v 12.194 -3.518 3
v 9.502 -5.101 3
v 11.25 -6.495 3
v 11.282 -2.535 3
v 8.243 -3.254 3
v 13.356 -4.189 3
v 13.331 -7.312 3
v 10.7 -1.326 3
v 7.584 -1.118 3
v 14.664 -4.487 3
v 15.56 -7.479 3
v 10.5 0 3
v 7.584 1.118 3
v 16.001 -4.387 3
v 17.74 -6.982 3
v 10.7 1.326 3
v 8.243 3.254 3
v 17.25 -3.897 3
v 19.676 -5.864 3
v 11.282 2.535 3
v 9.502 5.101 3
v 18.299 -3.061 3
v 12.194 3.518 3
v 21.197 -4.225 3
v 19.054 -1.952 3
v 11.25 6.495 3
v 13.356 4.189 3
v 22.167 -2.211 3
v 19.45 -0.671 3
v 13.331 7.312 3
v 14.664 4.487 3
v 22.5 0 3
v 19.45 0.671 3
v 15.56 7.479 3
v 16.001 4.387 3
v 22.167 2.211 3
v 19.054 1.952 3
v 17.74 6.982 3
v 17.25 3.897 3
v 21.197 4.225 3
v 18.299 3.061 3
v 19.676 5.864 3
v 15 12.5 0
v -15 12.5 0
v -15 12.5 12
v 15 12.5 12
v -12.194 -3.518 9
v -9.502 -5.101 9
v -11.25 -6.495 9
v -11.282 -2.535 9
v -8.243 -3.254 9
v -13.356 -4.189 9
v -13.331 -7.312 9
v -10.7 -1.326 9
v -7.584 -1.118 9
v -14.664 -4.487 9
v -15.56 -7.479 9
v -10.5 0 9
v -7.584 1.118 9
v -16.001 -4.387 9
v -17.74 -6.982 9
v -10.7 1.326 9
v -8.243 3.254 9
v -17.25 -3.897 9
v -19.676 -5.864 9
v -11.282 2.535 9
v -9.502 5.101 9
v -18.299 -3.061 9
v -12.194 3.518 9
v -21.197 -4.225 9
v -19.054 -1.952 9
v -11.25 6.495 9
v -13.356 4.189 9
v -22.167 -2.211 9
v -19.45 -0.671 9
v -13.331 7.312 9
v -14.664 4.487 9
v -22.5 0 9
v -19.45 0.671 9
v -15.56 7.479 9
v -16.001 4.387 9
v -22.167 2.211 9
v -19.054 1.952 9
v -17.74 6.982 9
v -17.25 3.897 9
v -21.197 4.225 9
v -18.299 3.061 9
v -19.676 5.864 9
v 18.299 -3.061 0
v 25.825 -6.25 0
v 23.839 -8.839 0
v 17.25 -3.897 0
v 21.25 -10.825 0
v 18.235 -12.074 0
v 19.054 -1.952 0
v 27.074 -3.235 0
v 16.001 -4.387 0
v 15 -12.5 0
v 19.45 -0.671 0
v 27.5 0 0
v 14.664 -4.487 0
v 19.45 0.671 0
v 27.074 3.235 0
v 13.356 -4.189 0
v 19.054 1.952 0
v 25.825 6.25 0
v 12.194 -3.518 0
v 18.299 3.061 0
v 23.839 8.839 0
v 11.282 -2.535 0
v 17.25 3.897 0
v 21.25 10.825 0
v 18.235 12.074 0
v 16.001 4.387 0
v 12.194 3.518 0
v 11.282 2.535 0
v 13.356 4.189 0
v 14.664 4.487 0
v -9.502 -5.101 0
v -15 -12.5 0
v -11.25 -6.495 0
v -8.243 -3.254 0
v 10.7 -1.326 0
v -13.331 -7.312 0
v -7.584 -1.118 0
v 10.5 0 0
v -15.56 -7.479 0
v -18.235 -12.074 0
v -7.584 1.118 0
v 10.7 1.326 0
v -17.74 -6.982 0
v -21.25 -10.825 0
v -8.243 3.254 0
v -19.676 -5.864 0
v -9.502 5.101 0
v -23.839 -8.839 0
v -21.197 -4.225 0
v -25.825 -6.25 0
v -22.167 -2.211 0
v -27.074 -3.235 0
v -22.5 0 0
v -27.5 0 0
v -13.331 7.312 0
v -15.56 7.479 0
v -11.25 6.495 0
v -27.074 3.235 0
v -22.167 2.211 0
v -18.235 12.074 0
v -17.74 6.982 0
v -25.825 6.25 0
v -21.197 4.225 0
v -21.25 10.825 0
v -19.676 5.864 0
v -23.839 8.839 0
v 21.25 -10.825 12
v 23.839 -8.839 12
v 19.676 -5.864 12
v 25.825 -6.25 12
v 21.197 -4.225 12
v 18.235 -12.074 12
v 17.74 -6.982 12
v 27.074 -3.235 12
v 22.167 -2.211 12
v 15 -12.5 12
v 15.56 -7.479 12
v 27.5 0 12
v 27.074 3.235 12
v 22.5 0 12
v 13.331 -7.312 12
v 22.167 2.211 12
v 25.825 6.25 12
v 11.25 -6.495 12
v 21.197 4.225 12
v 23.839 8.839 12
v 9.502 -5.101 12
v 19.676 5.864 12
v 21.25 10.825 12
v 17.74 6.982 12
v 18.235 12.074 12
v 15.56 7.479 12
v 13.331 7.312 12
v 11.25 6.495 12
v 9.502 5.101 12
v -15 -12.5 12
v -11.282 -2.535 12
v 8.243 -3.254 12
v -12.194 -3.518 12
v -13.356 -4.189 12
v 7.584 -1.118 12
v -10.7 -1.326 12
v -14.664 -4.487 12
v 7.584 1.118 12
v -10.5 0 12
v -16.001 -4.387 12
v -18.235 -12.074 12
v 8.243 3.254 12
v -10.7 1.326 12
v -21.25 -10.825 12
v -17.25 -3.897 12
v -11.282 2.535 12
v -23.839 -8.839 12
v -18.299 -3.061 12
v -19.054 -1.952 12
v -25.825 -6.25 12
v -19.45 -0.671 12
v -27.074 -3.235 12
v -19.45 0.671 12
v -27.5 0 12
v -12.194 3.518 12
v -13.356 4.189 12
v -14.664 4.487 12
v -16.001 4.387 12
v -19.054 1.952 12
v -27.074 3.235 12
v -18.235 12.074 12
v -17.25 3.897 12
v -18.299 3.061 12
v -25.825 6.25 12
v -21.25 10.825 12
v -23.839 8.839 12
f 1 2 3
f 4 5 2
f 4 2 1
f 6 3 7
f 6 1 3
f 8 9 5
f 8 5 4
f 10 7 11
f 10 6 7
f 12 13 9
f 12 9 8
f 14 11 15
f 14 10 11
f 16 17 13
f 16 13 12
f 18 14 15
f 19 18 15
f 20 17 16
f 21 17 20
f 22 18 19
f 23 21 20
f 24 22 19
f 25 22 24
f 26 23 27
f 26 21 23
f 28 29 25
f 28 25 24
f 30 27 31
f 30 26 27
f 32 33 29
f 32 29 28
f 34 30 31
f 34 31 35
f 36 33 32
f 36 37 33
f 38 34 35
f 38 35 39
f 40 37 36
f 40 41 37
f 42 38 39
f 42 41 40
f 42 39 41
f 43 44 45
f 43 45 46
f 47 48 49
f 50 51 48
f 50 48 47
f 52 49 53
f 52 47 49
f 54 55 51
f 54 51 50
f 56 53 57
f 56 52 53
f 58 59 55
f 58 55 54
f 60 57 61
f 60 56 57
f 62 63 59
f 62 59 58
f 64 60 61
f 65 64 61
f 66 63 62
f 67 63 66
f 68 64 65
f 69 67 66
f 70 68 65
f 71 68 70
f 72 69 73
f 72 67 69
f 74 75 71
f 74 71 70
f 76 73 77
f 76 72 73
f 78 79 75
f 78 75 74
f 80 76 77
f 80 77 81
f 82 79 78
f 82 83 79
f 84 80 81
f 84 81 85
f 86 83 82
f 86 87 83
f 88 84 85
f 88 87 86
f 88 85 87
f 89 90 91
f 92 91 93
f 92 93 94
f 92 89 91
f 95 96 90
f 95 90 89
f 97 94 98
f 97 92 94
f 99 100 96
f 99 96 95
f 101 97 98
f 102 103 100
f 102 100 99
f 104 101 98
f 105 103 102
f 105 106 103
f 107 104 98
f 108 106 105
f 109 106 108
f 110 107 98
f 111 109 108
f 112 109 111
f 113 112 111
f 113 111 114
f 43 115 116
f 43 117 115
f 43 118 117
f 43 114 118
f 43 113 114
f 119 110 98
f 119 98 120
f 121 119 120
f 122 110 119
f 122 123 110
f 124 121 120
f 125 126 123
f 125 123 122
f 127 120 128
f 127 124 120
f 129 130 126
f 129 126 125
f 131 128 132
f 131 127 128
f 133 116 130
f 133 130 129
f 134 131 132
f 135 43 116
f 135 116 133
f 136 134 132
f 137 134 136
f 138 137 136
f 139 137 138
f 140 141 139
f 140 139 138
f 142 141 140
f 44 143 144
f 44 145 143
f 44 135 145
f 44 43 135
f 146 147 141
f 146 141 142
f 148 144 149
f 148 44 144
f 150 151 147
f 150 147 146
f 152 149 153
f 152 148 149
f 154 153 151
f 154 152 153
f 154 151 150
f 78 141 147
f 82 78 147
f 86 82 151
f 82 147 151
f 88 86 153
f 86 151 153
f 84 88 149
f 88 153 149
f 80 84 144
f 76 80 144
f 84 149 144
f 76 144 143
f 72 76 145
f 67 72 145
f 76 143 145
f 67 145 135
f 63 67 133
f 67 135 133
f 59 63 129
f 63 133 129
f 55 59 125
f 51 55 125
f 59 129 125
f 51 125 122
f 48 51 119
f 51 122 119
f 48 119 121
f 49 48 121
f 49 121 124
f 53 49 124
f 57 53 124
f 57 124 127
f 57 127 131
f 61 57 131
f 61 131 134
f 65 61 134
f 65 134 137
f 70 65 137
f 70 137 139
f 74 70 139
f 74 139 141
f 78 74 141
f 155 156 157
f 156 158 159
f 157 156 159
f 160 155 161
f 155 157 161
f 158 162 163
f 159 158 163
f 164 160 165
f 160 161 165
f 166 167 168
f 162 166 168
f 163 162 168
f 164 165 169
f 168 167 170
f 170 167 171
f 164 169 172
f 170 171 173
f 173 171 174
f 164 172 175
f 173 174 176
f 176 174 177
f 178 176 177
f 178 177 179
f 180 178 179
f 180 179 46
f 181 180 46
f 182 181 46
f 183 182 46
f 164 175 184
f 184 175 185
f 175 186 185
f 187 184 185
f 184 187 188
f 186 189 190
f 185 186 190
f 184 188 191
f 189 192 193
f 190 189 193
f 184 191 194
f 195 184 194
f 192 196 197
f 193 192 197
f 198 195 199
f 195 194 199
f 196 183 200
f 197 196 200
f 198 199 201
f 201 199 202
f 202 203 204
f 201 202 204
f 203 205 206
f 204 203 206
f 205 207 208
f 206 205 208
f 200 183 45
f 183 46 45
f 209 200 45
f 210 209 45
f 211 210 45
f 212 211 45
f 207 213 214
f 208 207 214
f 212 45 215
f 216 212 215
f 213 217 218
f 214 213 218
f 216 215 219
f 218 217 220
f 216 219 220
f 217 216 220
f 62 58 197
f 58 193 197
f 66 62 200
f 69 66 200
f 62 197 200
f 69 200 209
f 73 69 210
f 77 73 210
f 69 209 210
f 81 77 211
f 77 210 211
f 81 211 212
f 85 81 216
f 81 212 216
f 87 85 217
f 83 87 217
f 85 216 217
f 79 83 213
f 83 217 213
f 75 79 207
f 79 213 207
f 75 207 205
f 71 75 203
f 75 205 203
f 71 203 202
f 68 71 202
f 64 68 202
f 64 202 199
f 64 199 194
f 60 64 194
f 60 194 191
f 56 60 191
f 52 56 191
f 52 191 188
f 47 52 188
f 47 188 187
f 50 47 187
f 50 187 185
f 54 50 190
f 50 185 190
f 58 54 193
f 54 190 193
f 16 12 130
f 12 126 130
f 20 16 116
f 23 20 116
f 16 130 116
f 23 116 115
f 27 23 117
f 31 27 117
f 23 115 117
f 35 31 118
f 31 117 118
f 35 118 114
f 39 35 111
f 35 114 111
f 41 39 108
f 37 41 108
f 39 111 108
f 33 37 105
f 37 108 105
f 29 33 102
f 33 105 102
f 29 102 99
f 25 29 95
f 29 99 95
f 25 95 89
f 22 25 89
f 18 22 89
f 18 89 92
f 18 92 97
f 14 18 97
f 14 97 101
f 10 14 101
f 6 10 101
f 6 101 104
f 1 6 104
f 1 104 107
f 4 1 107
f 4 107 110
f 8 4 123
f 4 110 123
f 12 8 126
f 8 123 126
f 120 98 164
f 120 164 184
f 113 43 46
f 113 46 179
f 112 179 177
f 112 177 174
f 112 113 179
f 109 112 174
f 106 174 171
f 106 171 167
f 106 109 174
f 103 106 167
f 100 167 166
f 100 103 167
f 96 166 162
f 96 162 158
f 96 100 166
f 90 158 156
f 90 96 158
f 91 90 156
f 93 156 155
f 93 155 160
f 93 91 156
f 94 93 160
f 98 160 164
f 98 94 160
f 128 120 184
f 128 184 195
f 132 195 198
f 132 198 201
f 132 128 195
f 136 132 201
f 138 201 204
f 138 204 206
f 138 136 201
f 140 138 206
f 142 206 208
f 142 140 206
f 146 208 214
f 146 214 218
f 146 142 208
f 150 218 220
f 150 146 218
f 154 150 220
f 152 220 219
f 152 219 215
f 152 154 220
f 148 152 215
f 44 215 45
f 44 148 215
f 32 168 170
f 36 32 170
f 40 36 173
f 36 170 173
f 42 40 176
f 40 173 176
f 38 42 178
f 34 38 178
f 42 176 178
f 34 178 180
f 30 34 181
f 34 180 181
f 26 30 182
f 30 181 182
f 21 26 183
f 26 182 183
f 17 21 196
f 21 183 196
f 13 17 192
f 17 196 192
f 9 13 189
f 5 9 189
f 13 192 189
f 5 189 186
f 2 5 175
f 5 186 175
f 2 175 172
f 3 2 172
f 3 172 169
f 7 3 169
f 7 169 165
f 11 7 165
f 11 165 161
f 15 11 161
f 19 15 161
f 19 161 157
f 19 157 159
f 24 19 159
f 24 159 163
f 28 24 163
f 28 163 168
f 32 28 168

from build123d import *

# Parameters (mm, degrees)
EXTRUDE_1_DEPTH           = 12
HOLE_WIZARD_1_D           = 9
HOLE_WIZARD_1_DEPTH       = 19.75
HOLE_WIZARD_1_CBORE_D     = 15
HOLE_WIZARD_1_CBORE_DEPTH = 9
HOLE_WIZARD_1_TIP         = 2.703872786
HOLE_WIZARD_2_D           = 9
HOLE_WIZARD_2_DEPTH       = 19.75
HOLE_WIZARD_2_CBORE_D     = 15
HOLE_WIZARD_2_CBORE_DEPTH = 9
HOLE_WIZARD_2_TIP         = 2.703872786


with BuildPart() as part:
    # 草图1 → 凸台-拉伸1 (new body)
    with BuildSketch(Plane.XY):
        with BuildLine():
            Line((-15, 12.5), (15, 12.5))
            ThreePointArc((15, 12.5), (27.5, 0), (15, -12.5))
            Line((15, -12.5), (-15, -12.5))
            ThreePointArc((-15, -12.5), (-27.5, 0), (-15, 12.5))
        make_face()
    extrude(amount=EXTRUDE_1_DEPTH)

    # 打孔尺寸(%根据)内六角圆柱头螺钉的类型1
    with Locations(Plane(origin=(0, 0, 0), x_dir=(-1, 0, 0), z_dir=(0, 0, -1))):
        with Locations((15, 0)):
            CounterBoreHole(HOLE_WIZARD_1_D / 2, HOLE_WIZARD_1_CBORE_D / 2, HOLE_WIZARD_1_CBORE_DEPTH, depth=HOLE_WIZARD_1_DEPTH)
            with Locations((0, 0, -(HOLE_WIZARD_1_DEPTH + HOLE_WIZARD_1_TIP / 2))):  # 118° drill point
                Cone(0, HOLE_WIZARD_1_D / 2, HOLE_WIZARD_1_TIP, mode=Mode.SUBTRACT)

    # 打孔尺寸(%根据)内六角圆柱头螺钉的类型2
    with Locations(Plane.XY.offset(12)):
        with Locations((15, 0)):
            CounterBoreHole(HOLE_WIZARD_2_D / 2, HOLE_WIZARD_2_CBORE_D / 2, HOLE_WIZARD_2_CBORE_DEPTH, depth=HOLE_WIZARD_2_DEPTH)
            with Locations((0, 0, -(HOLE_WIZARD_2_DEPTH + HOLE_WIZARD_2_TIP / 2))):  # 118° drill point
                Cone(0, HOLE_WIZARD_2_D / 2, HOLE_WIZARD_2_TIP, mode=Mode.SUBTRACT)


solid = part.part
